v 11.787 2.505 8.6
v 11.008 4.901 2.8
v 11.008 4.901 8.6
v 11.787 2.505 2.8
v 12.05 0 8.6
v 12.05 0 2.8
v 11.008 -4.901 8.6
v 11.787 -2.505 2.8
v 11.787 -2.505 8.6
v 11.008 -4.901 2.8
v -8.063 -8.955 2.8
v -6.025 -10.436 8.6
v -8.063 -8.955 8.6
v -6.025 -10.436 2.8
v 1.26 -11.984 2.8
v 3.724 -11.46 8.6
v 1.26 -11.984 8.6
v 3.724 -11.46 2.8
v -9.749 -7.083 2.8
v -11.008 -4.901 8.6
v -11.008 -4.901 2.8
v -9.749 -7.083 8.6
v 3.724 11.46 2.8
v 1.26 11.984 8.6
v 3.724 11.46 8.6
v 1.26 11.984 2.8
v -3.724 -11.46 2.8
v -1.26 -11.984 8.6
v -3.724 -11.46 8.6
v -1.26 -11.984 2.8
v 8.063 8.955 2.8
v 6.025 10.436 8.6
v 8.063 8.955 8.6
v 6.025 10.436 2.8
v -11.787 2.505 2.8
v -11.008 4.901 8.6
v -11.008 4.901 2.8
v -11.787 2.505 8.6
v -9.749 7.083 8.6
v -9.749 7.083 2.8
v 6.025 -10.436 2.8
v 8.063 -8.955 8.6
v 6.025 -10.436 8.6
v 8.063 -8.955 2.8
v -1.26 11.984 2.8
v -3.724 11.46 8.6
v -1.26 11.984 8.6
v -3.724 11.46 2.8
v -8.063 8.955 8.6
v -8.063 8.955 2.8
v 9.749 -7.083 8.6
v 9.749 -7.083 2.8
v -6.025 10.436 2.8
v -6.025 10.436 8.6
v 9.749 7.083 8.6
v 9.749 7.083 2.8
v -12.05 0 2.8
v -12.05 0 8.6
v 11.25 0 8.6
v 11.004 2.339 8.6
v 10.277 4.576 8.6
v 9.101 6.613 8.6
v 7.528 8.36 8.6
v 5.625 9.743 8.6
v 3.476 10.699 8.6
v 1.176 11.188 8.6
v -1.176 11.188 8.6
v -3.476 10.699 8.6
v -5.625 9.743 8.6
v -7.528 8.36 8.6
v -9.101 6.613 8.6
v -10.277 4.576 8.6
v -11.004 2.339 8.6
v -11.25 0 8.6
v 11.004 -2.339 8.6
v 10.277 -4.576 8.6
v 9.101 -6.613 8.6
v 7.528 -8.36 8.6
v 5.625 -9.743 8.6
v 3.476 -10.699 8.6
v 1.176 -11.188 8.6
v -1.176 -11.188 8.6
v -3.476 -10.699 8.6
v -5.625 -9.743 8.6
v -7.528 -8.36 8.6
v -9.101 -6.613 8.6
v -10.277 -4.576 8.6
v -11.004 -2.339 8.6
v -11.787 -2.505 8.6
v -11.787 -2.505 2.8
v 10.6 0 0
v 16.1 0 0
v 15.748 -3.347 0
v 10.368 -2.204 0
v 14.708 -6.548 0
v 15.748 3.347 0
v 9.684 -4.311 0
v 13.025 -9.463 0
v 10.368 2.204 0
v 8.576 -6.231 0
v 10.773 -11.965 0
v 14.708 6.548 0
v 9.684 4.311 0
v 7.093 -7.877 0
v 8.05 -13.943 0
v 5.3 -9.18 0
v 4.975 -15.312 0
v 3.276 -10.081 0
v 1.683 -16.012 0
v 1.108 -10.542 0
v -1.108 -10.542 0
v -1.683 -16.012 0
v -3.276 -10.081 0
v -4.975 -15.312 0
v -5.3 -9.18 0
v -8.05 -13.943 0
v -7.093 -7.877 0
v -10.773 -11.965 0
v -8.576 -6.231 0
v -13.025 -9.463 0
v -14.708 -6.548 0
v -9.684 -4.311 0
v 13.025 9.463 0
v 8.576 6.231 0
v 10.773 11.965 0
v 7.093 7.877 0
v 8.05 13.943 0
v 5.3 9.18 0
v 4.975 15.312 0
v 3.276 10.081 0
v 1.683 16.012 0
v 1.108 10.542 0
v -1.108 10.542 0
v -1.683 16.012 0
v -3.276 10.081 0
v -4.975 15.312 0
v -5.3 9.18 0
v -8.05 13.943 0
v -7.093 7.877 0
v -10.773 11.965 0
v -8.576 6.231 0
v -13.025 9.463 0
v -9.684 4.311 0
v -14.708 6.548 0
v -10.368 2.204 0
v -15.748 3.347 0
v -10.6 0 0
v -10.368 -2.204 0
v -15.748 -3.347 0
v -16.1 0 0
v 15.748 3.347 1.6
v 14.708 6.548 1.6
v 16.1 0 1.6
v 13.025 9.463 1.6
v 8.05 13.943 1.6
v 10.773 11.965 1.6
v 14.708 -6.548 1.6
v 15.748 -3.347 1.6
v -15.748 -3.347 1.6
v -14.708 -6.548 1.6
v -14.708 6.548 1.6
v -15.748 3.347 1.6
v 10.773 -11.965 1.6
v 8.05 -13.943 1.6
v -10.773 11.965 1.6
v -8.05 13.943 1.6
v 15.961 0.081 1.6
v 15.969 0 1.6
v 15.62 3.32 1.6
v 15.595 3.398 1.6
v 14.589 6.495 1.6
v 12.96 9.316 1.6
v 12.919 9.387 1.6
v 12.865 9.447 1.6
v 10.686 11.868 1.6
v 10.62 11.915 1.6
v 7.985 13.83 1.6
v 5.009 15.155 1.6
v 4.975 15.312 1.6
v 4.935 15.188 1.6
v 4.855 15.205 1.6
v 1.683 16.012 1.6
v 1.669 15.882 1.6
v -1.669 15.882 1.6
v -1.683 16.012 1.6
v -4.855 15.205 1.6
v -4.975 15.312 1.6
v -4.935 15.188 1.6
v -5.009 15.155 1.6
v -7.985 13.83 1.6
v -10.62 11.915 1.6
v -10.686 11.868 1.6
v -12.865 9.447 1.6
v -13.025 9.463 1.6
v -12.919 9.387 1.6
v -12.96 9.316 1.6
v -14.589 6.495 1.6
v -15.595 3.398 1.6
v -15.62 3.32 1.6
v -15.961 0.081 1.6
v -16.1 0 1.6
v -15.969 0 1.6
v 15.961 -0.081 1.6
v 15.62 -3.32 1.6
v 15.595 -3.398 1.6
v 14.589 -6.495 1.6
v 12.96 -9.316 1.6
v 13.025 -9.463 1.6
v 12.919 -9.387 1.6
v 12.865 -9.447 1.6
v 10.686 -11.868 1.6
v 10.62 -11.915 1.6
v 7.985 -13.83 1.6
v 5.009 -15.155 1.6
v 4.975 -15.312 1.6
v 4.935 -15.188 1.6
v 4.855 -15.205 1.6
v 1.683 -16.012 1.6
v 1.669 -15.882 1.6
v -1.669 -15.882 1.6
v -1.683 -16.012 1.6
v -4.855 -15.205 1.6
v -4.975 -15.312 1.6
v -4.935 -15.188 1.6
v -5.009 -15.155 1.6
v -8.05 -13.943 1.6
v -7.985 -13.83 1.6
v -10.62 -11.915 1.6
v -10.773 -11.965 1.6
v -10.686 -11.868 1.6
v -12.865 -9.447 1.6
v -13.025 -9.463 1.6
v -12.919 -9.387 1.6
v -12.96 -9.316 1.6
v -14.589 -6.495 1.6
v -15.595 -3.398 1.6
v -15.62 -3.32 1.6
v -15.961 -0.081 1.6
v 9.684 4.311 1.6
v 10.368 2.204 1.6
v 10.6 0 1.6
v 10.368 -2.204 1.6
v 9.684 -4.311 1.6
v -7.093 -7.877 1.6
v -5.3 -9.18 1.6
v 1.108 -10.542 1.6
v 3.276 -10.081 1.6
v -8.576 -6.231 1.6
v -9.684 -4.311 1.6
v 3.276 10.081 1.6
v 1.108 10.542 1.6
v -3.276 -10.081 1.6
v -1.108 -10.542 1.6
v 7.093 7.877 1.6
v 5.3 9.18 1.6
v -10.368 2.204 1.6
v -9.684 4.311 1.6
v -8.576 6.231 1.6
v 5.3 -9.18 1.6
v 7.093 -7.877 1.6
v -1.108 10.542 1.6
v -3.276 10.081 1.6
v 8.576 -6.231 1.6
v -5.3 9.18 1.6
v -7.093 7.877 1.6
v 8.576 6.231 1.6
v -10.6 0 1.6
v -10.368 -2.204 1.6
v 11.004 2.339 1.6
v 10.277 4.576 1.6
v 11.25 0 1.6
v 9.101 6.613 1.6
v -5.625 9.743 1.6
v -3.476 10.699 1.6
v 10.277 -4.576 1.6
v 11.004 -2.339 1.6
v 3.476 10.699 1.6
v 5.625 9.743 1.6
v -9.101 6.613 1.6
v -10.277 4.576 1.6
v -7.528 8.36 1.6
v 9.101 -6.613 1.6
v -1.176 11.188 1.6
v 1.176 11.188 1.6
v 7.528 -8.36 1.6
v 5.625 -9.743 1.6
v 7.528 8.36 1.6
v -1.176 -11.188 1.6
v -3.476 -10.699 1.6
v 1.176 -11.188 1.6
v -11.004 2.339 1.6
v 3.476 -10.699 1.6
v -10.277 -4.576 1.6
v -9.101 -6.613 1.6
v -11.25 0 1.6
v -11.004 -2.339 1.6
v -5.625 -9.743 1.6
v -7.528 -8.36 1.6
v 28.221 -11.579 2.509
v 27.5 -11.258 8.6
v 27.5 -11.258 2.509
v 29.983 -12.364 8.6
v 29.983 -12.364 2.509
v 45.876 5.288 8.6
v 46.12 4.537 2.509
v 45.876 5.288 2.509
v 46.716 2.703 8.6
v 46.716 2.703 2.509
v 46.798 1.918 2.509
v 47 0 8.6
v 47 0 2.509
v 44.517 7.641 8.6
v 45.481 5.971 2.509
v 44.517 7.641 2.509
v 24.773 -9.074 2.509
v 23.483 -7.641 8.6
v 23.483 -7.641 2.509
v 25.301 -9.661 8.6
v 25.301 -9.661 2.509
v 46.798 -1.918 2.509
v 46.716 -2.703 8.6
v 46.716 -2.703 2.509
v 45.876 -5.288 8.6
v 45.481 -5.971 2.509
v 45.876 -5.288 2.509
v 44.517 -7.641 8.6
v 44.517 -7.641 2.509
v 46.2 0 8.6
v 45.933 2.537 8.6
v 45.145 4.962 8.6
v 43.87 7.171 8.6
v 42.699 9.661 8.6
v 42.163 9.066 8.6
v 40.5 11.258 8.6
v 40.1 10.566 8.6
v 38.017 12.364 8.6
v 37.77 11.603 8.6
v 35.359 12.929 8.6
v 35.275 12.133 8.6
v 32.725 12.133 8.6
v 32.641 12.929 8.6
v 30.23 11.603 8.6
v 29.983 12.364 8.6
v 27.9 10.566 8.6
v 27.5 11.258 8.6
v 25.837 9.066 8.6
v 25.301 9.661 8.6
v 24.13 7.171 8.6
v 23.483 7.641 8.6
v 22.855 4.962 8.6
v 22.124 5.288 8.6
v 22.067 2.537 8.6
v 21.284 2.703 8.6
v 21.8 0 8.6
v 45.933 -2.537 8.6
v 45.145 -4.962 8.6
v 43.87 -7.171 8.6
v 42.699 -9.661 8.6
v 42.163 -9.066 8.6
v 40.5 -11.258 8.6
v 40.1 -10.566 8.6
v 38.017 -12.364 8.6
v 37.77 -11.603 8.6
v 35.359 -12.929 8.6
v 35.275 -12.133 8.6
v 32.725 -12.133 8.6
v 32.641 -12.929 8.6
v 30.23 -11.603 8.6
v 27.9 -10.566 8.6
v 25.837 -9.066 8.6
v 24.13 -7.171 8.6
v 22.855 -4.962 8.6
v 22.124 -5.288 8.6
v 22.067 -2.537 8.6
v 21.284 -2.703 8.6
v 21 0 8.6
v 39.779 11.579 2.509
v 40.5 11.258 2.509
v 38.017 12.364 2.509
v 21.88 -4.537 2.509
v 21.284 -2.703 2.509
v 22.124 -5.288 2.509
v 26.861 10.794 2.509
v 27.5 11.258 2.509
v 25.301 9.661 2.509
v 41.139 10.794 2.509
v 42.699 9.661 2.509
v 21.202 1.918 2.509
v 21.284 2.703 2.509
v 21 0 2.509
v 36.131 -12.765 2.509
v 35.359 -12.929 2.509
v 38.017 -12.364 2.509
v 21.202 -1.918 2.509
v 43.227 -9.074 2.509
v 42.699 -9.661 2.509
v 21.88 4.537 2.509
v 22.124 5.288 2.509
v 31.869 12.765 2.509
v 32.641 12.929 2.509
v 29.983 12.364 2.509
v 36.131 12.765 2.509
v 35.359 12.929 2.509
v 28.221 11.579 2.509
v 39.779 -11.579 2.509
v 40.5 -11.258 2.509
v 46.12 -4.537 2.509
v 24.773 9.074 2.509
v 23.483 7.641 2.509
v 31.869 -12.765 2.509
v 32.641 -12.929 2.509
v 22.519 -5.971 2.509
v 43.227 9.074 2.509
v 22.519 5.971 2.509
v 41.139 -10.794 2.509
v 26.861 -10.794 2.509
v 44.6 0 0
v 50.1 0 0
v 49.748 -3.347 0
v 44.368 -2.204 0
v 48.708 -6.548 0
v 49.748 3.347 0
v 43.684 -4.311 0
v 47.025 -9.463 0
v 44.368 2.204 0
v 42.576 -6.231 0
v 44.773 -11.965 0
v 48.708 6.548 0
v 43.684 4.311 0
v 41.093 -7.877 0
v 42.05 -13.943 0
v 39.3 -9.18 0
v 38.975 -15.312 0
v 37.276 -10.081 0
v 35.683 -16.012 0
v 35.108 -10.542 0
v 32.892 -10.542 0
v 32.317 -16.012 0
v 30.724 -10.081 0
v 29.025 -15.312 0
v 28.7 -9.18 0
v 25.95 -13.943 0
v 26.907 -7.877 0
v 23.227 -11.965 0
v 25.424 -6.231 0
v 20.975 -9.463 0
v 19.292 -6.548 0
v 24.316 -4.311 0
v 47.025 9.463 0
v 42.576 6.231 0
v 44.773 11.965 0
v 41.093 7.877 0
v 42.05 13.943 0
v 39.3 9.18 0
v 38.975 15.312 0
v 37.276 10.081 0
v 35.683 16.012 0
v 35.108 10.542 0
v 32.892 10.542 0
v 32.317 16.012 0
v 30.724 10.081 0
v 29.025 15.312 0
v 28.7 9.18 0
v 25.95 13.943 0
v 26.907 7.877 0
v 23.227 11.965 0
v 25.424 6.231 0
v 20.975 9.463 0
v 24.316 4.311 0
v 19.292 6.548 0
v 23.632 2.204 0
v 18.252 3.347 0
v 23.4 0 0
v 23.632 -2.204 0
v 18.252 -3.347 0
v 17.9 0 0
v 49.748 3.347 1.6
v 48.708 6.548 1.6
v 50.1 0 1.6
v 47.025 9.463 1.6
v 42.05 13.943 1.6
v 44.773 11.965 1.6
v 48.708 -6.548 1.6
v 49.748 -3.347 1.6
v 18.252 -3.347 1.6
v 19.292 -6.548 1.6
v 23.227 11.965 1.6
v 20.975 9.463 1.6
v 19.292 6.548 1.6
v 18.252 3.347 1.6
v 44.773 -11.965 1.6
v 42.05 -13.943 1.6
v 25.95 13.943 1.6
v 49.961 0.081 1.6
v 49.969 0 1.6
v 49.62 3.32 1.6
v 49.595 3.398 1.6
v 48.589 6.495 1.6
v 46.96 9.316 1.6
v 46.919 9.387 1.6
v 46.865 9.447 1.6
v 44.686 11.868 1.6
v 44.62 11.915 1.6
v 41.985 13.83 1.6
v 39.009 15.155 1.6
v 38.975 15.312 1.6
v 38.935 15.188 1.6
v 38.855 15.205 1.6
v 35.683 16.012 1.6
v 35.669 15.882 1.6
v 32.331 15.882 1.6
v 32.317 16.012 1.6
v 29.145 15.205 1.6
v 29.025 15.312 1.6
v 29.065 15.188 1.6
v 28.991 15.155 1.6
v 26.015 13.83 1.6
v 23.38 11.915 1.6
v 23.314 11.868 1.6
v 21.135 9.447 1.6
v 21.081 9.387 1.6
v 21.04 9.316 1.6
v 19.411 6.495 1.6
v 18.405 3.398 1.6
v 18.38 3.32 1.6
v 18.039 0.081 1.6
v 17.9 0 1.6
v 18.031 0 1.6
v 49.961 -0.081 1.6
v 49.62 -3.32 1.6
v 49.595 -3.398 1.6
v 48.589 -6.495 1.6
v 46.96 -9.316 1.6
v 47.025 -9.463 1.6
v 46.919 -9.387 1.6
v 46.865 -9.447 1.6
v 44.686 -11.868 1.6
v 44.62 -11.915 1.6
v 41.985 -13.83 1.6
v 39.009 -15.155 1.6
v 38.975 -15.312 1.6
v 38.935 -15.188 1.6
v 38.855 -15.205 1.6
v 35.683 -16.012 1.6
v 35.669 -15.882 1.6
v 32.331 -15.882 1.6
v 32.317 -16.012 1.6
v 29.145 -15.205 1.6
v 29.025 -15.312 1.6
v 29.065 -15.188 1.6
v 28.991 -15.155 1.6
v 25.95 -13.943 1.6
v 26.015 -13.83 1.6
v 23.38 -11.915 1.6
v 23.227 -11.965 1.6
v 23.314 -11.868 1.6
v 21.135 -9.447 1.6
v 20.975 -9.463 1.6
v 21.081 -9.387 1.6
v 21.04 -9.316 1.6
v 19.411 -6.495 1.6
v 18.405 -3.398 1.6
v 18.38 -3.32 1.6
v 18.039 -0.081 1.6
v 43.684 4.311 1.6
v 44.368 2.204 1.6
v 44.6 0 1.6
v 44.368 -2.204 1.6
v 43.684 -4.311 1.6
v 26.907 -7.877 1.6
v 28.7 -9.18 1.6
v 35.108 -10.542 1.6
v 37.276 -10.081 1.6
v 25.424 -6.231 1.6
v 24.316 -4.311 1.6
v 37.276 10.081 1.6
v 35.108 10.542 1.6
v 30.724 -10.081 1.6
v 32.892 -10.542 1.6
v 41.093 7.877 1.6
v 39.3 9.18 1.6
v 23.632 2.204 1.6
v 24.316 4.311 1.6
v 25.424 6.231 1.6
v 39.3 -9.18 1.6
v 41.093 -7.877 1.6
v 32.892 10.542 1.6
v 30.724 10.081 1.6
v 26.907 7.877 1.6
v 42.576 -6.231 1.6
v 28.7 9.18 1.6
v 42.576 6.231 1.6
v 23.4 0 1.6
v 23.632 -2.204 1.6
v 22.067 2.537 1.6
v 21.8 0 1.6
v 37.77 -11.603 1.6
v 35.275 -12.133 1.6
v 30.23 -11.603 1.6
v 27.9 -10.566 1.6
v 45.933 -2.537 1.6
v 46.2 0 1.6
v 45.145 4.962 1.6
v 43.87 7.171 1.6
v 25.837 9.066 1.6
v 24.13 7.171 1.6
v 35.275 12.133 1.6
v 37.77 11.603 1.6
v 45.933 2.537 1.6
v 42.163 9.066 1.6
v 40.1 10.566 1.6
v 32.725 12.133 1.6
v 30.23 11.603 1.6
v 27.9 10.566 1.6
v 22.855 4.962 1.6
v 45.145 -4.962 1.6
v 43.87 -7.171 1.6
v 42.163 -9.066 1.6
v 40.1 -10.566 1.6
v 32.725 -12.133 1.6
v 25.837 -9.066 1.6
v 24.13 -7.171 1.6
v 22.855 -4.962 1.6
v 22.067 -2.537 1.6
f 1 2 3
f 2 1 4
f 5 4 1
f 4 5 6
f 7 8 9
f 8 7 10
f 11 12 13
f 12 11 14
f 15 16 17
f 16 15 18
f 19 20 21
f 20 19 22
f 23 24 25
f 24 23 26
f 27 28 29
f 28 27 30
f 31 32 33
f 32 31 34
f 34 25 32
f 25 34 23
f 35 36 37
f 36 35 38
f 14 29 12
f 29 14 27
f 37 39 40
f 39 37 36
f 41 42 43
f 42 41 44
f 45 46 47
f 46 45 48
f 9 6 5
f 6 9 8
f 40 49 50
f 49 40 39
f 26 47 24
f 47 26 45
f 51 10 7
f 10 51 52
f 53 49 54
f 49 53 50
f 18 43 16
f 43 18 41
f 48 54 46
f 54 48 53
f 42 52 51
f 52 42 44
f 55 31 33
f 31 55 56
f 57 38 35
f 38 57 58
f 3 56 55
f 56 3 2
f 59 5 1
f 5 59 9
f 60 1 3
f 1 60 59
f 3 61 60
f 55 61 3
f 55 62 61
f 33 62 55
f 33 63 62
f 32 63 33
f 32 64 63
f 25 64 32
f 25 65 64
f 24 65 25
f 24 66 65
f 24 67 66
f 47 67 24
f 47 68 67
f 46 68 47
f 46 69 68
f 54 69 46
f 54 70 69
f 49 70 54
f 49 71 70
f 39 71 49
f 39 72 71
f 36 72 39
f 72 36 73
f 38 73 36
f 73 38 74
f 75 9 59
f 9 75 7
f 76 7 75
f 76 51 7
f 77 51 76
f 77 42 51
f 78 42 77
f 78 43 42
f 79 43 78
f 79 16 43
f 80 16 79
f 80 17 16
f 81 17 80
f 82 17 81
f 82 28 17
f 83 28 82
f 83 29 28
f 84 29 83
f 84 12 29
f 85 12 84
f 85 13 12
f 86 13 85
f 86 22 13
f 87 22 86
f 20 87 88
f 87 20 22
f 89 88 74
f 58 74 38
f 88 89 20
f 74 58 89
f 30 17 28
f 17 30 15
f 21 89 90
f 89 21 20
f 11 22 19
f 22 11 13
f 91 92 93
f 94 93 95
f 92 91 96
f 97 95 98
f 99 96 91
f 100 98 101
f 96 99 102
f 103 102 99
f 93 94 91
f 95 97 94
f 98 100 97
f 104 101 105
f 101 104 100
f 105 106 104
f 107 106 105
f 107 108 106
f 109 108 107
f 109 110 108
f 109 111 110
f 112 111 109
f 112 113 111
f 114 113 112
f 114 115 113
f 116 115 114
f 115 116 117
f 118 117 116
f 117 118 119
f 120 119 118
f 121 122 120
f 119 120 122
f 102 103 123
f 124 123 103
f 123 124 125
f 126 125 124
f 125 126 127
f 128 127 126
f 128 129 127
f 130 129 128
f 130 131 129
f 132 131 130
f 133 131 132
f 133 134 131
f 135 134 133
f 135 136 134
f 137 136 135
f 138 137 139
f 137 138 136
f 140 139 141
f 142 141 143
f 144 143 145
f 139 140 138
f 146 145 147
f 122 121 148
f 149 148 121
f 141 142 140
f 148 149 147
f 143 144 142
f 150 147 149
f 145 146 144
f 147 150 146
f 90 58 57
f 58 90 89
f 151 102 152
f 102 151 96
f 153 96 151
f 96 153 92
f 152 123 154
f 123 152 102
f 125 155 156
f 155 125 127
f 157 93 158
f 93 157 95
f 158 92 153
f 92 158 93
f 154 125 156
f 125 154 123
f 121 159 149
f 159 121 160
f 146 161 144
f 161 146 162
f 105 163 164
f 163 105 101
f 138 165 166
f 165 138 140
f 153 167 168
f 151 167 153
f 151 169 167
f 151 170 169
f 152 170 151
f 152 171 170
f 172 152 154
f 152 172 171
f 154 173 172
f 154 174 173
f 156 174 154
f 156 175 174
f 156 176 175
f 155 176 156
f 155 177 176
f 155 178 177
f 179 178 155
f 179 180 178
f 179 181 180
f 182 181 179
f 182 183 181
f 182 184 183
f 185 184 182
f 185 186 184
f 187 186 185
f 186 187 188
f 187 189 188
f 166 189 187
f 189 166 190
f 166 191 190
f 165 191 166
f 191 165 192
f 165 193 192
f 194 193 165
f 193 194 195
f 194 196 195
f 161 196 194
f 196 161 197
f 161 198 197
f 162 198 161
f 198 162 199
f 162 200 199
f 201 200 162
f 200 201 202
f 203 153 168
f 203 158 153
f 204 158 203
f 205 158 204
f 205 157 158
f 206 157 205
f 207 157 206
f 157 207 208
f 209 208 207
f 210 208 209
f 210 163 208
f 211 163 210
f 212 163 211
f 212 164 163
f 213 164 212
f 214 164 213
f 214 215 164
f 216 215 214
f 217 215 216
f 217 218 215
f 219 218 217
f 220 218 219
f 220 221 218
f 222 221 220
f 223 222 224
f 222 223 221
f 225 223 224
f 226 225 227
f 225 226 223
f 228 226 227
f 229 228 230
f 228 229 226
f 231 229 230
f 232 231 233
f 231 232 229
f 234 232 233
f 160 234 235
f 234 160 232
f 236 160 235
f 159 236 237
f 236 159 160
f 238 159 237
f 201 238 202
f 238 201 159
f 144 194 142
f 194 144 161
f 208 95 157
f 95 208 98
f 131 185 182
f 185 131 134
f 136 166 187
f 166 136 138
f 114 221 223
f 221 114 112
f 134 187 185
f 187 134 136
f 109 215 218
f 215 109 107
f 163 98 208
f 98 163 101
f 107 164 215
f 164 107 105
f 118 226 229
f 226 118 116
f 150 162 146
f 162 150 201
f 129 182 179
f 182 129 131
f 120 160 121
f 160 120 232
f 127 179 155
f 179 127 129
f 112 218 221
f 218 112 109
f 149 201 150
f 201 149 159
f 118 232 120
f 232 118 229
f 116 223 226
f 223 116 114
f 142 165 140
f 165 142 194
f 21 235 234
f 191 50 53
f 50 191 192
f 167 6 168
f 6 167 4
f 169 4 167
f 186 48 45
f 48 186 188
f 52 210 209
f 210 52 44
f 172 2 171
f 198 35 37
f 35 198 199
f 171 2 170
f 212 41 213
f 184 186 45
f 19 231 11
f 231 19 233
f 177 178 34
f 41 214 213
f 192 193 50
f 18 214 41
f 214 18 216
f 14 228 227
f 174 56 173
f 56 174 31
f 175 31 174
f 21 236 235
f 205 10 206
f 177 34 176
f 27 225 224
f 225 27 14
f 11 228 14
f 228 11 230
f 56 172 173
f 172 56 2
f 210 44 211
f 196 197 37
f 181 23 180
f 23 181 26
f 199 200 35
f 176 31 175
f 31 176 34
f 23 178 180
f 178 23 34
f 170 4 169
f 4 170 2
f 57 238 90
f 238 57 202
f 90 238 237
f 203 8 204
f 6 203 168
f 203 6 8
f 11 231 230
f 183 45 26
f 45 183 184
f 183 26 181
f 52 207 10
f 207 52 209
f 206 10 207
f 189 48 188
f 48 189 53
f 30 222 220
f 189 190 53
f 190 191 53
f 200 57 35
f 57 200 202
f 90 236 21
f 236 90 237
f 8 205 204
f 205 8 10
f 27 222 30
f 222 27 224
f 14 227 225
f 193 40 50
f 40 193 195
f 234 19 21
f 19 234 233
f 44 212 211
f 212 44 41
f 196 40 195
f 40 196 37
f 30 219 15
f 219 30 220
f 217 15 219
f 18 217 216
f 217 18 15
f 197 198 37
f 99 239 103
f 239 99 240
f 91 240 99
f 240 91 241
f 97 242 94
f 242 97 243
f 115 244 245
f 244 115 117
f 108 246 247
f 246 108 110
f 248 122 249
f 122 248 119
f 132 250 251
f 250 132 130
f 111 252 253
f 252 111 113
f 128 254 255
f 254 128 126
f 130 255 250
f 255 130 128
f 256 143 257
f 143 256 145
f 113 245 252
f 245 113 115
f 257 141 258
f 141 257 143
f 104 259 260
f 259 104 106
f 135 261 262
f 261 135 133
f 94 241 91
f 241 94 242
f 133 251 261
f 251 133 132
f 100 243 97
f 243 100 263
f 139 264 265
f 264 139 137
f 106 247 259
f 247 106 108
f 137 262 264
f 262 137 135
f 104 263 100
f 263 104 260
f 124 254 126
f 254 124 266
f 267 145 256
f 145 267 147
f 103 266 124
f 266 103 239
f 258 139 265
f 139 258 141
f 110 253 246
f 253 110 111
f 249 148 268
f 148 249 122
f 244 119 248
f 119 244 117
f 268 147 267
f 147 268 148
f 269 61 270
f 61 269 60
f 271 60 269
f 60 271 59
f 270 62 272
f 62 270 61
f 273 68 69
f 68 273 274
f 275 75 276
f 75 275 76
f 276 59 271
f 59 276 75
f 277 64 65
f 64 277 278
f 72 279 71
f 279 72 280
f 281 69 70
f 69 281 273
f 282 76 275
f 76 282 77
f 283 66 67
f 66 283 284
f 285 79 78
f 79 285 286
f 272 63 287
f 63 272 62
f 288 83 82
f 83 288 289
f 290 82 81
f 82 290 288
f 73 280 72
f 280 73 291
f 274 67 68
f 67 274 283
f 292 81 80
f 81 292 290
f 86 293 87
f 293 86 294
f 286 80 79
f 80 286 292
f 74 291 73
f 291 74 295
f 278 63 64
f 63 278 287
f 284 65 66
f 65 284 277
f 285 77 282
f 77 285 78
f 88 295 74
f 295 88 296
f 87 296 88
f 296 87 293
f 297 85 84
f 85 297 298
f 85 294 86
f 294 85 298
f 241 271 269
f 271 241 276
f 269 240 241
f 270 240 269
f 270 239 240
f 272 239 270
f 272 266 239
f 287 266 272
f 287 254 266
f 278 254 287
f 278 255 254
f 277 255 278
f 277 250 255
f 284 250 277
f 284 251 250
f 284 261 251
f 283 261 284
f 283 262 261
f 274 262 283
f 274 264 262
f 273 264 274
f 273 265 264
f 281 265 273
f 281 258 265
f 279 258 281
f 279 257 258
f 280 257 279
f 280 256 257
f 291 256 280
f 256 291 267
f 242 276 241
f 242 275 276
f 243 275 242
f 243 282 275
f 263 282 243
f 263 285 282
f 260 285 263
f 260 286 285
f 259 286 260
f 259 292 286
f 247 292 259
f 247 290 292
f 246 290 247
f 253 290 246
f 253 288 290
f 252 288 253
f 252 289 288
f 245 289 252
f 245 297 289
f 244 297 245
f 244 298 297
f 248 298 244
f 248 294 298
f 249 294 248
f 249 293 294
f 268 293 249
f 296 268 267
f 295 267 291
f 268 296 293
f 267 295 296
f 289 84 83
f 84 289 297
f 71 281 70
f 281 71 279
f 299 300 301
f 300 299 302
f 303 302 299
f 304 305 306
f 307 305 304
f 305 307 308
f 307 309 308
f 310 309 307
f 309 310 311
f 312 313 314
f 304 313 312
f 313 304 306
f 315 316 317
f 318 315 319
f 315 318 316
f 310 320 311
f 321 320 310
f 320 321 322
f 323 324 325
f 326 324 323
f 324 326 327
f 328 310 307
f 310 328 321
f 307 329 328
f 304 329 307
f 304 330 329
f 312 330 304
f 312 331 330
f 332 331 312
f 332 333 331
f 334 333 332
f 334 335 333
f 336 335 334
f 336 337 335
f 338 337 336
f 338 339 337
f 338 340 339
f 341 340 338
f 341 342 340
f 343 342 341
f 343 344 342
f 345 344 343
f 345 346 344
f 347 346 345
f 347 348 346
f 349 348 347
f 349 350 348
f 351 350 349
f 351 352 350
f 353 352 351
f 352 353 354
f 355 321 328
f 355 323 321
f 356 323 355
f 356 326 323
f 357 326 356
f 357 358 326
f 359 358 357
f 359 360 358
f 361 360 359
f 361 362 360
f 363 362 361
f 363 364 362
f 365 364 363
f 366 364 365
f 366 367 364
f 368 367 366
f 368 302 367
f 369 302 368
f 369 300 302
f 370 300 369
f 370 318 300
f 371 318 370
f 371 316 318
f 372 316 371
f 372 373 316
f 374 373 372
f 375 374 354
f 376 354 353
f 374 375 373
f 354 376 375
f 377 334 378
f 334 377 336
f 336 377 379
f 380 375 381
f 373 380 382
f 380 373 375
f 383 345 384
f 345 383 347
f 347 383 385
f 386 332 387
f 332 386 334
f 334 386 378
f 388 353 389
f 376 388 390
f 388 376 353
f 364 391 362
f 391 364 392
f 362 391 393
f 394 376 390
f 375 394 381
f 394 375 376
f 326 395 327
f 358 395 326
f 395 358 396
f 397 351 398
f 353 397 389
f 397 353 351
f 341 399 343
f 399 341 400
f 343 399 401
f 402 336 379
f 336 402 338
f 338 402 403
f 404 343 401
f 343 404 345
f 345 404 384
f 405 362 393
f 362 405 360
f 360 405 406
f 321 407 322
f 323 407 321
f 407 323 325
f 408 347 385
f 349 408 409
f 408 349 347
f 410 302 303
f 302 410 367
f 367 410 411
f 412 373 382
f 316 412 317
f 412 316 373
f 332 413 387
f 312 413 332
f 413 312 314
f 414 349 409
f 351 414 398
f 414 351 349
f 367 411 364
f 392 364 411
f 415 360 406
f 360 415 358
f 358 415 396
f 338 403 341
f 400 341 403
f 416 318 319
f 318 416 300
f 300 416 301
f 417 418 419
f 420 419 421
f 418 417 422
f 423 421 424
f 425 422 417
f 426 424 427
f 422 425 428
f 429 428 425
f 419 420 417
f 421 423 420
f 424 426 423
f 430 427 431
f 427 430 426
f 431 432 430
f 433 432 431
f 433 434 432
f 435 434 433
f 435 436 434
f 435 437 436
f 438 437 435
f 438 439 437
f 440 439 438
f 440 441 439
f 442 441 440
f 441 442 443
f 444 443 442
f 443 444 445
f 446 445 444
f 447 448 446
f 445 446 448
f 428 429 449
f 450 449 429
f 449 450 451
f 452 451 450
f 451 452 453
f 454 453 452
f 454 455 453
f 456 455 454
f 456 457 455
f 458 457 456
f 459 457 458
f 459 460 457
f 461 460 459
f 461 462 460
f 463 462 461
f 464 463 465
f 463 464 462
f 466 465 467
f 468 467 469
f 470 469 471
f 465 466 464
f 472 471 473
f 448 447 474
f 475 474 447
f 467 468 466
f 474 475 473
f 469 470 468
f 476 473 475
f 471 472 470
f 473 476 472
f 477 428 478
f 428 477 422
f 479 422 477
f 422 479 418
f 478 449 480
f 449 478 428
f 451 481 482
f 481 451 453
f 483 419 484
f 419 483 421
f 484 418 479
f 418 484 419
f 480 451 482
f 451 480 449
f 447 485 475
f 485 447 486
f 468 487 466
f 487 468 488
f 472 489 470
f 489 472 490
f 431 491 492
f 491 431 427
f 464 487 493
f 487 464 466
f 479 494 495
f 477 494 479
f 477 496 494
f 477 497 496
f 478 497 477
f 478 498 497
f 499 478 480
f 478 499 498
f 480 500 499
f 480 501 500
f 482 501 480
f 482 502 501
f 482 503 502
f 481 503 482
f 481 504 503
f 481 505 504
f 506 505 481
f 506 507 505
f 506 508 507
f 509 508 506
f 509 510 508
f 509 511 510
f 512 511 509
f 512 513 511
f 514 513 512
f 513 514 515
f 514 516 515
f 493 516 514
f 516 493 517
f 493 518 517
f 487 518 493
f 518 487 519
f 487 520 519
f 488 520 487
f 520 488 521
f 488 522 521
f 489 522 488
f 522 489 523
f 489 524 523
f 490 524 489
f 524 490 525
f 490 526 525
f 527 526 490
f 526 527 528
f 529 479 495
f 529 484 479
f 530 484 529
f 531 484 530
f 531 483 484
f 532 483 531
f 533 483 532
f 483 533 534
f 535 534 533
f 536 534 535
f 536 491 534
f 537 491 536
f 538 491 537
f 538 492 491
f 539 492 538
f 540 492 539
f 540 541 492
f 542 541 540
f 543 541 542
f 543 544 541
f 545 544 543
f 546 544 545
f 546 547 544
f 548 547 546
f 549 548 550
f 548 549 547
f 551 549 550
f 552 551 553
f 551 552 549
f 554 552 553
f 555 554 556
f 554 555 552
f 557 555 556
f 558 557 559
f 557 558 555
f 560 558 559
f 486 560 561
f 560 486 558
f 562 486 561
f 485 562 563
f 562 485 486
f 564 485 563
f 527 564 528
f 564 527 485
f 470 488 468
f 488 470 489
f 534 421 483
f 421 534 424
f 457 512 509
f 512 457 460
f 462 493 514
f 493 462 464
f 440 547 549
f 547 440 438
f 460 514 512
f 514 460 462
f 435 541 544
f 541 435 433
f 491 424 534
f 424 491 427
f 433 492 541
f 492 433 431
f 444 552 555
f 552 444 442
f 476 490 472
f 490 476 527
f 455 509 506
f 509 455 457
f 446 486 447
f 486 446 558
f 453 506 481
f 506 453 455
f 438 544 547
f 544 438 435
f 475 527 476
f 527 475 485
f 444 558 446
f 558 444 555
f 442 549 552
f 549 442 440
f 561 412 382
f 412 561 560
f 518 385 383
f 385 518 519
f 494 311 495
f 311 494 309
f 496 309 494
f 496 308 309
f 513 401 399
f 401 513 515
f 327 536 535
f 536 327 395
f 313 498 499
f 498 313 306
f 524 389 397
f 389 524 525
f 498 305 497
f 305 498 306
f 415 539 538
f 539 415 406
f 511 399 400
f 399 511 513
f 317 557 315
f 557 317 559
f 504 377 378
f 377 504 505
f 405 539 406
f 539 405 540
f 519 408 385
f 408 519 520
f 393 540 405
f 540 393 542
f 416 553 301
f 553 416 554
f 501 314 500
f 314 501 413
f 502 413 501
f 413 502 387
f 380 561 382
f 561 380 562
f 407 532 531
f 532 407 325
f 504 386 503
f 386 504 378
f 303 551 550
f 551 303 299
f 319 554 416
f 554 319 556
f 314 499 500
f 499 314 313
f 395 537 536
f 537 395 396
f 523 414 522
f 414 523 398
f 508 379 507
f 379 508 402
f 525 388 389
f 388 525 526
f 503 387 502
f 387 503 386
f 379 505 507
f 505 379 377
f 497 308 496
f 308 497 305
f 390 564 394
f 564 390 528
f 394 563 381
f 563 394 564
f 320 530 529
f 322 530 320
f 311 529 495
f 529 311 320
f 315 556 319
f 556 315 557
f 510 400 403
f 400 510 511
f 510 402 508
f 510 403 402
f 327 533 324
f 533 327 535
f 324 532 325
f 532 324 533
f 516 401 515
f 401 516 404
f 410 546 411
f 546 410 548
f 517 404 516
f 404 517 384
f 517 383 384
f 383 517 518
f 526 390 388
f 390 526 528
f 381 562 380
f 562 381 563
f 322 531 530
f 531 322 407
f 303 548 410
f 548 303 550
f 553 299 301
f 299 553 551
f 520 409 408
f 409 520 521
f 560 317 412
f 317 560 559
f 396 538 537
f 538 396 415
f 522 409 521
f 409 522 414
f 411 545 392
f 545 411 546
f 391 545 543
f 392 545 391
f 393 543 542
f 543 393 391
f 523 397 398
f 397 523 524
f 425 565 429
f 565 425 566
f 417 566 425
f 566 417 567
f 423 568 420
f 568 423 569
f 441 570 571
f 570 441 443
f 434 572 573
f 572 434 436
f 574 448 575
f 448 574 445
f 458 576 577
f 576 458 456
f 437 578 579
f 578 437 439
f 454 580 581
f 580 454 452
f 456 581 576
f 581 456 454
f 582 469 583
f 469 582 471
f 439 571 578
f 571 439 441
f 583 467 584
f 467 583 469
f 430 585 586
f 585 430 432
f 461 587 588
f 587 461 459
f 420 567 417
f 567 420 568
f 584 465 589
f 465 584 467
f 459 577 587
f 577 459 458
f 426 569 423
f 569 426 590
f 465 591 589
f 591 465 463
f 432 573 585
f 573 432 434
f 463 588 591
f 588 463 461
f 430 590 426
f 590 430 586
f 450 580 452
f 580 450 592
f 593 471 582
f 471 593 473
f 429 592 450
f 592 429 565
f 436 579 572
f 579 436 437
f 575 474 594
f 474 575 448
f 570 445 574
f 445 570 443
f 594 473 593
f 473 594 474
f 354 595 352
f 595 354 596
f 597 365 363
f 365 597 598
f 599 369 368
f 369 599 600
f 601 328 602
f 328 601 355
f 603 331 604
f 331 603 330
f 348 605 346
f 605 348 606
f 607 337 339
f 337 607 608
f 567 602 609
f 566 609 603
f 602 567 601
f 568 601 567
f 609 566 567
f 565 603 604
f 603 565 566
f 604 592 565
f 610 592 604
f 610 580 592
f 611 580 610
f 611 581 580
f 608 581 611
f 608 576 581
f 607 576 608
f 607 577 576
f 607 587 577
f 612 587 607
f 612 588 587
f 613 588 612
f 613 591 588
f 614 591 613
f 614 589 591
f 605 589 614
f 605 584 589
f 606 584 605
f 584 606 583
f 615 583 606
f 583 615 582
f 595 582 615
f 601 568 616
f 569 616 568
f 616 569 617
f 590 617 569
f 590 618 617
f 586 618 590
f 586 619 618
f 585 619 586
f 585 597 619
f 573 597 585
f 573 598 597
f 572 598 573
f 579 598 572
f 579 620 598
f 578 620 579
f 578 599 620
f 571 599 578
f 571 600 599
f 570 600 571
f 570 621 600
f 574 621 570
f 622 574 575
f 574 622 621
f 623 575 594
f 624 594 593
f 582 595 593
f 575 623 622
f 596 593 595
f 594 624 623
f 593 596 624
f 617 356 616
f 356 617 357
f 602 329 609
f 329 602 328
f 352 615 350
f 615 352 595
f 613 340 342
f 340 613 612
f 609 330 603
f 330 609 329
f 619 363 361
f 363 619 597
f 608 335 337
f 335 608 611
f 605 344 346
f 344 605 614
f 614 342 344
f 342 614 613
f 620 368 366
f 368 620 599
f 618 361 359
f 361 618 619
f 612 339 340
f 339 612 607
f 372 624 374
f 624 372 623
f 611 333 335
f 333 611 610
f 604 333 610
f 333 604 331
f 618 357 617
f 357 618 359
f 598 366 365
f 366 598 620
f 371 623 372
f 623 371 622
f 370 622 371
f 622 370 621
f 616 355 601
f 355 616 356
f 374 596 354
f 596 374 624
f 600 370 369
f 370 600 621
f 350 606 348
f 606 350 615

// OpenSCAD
//PRUSAMendel
//GNUGPLv2
//GregFrost

/**
*@categoryPrinted
*/

layer_height=0.4;
perimeter_w_over_t=2;

single_layer_width=layer_height*perimeter_w_over_t;
bearing_inner=22.2;

edge_thickness=layer_height*4;
slope_thickness=layer_height*3.1;
height=7+edge_thickness;
wall_ascent=5;
wall_descent=0.5;
tolerance=0.15;

module bearing_guide(inner_r=2)
{
	difference()
	{
		union()
		{
			cylinder(r=inner_r++single_layer_width,h=height);

			cylinder(r=bearing_inner/2+wall_ascent,h=edge_thickness);
			translate([0,0,edge_thickness-layer_height*0.1])
			cylinder(r1=bearing_inner/2+wall_ascent,
				r2=bearing_inner/2+single_layer_width+tolerance,
				h=slope_thickness);
		}
		translate([0,0,-1])
		cylinder(r=bearing_inner/2-wall_descent,h=edge_thickness+2);

		translate([0,0,edge_thickness])
		cylinder(r=inner_r,h=height);
	}
}

module inner()
{
	bearing_guide(inner_r=bearing_inner/2+tolerance);
}

module outer()
{
	bearing_guide(inner_r=bearing_inner/2+single_layer_width+2*+tolerance);
}

inner();

translate([34,0,0])
outer();
